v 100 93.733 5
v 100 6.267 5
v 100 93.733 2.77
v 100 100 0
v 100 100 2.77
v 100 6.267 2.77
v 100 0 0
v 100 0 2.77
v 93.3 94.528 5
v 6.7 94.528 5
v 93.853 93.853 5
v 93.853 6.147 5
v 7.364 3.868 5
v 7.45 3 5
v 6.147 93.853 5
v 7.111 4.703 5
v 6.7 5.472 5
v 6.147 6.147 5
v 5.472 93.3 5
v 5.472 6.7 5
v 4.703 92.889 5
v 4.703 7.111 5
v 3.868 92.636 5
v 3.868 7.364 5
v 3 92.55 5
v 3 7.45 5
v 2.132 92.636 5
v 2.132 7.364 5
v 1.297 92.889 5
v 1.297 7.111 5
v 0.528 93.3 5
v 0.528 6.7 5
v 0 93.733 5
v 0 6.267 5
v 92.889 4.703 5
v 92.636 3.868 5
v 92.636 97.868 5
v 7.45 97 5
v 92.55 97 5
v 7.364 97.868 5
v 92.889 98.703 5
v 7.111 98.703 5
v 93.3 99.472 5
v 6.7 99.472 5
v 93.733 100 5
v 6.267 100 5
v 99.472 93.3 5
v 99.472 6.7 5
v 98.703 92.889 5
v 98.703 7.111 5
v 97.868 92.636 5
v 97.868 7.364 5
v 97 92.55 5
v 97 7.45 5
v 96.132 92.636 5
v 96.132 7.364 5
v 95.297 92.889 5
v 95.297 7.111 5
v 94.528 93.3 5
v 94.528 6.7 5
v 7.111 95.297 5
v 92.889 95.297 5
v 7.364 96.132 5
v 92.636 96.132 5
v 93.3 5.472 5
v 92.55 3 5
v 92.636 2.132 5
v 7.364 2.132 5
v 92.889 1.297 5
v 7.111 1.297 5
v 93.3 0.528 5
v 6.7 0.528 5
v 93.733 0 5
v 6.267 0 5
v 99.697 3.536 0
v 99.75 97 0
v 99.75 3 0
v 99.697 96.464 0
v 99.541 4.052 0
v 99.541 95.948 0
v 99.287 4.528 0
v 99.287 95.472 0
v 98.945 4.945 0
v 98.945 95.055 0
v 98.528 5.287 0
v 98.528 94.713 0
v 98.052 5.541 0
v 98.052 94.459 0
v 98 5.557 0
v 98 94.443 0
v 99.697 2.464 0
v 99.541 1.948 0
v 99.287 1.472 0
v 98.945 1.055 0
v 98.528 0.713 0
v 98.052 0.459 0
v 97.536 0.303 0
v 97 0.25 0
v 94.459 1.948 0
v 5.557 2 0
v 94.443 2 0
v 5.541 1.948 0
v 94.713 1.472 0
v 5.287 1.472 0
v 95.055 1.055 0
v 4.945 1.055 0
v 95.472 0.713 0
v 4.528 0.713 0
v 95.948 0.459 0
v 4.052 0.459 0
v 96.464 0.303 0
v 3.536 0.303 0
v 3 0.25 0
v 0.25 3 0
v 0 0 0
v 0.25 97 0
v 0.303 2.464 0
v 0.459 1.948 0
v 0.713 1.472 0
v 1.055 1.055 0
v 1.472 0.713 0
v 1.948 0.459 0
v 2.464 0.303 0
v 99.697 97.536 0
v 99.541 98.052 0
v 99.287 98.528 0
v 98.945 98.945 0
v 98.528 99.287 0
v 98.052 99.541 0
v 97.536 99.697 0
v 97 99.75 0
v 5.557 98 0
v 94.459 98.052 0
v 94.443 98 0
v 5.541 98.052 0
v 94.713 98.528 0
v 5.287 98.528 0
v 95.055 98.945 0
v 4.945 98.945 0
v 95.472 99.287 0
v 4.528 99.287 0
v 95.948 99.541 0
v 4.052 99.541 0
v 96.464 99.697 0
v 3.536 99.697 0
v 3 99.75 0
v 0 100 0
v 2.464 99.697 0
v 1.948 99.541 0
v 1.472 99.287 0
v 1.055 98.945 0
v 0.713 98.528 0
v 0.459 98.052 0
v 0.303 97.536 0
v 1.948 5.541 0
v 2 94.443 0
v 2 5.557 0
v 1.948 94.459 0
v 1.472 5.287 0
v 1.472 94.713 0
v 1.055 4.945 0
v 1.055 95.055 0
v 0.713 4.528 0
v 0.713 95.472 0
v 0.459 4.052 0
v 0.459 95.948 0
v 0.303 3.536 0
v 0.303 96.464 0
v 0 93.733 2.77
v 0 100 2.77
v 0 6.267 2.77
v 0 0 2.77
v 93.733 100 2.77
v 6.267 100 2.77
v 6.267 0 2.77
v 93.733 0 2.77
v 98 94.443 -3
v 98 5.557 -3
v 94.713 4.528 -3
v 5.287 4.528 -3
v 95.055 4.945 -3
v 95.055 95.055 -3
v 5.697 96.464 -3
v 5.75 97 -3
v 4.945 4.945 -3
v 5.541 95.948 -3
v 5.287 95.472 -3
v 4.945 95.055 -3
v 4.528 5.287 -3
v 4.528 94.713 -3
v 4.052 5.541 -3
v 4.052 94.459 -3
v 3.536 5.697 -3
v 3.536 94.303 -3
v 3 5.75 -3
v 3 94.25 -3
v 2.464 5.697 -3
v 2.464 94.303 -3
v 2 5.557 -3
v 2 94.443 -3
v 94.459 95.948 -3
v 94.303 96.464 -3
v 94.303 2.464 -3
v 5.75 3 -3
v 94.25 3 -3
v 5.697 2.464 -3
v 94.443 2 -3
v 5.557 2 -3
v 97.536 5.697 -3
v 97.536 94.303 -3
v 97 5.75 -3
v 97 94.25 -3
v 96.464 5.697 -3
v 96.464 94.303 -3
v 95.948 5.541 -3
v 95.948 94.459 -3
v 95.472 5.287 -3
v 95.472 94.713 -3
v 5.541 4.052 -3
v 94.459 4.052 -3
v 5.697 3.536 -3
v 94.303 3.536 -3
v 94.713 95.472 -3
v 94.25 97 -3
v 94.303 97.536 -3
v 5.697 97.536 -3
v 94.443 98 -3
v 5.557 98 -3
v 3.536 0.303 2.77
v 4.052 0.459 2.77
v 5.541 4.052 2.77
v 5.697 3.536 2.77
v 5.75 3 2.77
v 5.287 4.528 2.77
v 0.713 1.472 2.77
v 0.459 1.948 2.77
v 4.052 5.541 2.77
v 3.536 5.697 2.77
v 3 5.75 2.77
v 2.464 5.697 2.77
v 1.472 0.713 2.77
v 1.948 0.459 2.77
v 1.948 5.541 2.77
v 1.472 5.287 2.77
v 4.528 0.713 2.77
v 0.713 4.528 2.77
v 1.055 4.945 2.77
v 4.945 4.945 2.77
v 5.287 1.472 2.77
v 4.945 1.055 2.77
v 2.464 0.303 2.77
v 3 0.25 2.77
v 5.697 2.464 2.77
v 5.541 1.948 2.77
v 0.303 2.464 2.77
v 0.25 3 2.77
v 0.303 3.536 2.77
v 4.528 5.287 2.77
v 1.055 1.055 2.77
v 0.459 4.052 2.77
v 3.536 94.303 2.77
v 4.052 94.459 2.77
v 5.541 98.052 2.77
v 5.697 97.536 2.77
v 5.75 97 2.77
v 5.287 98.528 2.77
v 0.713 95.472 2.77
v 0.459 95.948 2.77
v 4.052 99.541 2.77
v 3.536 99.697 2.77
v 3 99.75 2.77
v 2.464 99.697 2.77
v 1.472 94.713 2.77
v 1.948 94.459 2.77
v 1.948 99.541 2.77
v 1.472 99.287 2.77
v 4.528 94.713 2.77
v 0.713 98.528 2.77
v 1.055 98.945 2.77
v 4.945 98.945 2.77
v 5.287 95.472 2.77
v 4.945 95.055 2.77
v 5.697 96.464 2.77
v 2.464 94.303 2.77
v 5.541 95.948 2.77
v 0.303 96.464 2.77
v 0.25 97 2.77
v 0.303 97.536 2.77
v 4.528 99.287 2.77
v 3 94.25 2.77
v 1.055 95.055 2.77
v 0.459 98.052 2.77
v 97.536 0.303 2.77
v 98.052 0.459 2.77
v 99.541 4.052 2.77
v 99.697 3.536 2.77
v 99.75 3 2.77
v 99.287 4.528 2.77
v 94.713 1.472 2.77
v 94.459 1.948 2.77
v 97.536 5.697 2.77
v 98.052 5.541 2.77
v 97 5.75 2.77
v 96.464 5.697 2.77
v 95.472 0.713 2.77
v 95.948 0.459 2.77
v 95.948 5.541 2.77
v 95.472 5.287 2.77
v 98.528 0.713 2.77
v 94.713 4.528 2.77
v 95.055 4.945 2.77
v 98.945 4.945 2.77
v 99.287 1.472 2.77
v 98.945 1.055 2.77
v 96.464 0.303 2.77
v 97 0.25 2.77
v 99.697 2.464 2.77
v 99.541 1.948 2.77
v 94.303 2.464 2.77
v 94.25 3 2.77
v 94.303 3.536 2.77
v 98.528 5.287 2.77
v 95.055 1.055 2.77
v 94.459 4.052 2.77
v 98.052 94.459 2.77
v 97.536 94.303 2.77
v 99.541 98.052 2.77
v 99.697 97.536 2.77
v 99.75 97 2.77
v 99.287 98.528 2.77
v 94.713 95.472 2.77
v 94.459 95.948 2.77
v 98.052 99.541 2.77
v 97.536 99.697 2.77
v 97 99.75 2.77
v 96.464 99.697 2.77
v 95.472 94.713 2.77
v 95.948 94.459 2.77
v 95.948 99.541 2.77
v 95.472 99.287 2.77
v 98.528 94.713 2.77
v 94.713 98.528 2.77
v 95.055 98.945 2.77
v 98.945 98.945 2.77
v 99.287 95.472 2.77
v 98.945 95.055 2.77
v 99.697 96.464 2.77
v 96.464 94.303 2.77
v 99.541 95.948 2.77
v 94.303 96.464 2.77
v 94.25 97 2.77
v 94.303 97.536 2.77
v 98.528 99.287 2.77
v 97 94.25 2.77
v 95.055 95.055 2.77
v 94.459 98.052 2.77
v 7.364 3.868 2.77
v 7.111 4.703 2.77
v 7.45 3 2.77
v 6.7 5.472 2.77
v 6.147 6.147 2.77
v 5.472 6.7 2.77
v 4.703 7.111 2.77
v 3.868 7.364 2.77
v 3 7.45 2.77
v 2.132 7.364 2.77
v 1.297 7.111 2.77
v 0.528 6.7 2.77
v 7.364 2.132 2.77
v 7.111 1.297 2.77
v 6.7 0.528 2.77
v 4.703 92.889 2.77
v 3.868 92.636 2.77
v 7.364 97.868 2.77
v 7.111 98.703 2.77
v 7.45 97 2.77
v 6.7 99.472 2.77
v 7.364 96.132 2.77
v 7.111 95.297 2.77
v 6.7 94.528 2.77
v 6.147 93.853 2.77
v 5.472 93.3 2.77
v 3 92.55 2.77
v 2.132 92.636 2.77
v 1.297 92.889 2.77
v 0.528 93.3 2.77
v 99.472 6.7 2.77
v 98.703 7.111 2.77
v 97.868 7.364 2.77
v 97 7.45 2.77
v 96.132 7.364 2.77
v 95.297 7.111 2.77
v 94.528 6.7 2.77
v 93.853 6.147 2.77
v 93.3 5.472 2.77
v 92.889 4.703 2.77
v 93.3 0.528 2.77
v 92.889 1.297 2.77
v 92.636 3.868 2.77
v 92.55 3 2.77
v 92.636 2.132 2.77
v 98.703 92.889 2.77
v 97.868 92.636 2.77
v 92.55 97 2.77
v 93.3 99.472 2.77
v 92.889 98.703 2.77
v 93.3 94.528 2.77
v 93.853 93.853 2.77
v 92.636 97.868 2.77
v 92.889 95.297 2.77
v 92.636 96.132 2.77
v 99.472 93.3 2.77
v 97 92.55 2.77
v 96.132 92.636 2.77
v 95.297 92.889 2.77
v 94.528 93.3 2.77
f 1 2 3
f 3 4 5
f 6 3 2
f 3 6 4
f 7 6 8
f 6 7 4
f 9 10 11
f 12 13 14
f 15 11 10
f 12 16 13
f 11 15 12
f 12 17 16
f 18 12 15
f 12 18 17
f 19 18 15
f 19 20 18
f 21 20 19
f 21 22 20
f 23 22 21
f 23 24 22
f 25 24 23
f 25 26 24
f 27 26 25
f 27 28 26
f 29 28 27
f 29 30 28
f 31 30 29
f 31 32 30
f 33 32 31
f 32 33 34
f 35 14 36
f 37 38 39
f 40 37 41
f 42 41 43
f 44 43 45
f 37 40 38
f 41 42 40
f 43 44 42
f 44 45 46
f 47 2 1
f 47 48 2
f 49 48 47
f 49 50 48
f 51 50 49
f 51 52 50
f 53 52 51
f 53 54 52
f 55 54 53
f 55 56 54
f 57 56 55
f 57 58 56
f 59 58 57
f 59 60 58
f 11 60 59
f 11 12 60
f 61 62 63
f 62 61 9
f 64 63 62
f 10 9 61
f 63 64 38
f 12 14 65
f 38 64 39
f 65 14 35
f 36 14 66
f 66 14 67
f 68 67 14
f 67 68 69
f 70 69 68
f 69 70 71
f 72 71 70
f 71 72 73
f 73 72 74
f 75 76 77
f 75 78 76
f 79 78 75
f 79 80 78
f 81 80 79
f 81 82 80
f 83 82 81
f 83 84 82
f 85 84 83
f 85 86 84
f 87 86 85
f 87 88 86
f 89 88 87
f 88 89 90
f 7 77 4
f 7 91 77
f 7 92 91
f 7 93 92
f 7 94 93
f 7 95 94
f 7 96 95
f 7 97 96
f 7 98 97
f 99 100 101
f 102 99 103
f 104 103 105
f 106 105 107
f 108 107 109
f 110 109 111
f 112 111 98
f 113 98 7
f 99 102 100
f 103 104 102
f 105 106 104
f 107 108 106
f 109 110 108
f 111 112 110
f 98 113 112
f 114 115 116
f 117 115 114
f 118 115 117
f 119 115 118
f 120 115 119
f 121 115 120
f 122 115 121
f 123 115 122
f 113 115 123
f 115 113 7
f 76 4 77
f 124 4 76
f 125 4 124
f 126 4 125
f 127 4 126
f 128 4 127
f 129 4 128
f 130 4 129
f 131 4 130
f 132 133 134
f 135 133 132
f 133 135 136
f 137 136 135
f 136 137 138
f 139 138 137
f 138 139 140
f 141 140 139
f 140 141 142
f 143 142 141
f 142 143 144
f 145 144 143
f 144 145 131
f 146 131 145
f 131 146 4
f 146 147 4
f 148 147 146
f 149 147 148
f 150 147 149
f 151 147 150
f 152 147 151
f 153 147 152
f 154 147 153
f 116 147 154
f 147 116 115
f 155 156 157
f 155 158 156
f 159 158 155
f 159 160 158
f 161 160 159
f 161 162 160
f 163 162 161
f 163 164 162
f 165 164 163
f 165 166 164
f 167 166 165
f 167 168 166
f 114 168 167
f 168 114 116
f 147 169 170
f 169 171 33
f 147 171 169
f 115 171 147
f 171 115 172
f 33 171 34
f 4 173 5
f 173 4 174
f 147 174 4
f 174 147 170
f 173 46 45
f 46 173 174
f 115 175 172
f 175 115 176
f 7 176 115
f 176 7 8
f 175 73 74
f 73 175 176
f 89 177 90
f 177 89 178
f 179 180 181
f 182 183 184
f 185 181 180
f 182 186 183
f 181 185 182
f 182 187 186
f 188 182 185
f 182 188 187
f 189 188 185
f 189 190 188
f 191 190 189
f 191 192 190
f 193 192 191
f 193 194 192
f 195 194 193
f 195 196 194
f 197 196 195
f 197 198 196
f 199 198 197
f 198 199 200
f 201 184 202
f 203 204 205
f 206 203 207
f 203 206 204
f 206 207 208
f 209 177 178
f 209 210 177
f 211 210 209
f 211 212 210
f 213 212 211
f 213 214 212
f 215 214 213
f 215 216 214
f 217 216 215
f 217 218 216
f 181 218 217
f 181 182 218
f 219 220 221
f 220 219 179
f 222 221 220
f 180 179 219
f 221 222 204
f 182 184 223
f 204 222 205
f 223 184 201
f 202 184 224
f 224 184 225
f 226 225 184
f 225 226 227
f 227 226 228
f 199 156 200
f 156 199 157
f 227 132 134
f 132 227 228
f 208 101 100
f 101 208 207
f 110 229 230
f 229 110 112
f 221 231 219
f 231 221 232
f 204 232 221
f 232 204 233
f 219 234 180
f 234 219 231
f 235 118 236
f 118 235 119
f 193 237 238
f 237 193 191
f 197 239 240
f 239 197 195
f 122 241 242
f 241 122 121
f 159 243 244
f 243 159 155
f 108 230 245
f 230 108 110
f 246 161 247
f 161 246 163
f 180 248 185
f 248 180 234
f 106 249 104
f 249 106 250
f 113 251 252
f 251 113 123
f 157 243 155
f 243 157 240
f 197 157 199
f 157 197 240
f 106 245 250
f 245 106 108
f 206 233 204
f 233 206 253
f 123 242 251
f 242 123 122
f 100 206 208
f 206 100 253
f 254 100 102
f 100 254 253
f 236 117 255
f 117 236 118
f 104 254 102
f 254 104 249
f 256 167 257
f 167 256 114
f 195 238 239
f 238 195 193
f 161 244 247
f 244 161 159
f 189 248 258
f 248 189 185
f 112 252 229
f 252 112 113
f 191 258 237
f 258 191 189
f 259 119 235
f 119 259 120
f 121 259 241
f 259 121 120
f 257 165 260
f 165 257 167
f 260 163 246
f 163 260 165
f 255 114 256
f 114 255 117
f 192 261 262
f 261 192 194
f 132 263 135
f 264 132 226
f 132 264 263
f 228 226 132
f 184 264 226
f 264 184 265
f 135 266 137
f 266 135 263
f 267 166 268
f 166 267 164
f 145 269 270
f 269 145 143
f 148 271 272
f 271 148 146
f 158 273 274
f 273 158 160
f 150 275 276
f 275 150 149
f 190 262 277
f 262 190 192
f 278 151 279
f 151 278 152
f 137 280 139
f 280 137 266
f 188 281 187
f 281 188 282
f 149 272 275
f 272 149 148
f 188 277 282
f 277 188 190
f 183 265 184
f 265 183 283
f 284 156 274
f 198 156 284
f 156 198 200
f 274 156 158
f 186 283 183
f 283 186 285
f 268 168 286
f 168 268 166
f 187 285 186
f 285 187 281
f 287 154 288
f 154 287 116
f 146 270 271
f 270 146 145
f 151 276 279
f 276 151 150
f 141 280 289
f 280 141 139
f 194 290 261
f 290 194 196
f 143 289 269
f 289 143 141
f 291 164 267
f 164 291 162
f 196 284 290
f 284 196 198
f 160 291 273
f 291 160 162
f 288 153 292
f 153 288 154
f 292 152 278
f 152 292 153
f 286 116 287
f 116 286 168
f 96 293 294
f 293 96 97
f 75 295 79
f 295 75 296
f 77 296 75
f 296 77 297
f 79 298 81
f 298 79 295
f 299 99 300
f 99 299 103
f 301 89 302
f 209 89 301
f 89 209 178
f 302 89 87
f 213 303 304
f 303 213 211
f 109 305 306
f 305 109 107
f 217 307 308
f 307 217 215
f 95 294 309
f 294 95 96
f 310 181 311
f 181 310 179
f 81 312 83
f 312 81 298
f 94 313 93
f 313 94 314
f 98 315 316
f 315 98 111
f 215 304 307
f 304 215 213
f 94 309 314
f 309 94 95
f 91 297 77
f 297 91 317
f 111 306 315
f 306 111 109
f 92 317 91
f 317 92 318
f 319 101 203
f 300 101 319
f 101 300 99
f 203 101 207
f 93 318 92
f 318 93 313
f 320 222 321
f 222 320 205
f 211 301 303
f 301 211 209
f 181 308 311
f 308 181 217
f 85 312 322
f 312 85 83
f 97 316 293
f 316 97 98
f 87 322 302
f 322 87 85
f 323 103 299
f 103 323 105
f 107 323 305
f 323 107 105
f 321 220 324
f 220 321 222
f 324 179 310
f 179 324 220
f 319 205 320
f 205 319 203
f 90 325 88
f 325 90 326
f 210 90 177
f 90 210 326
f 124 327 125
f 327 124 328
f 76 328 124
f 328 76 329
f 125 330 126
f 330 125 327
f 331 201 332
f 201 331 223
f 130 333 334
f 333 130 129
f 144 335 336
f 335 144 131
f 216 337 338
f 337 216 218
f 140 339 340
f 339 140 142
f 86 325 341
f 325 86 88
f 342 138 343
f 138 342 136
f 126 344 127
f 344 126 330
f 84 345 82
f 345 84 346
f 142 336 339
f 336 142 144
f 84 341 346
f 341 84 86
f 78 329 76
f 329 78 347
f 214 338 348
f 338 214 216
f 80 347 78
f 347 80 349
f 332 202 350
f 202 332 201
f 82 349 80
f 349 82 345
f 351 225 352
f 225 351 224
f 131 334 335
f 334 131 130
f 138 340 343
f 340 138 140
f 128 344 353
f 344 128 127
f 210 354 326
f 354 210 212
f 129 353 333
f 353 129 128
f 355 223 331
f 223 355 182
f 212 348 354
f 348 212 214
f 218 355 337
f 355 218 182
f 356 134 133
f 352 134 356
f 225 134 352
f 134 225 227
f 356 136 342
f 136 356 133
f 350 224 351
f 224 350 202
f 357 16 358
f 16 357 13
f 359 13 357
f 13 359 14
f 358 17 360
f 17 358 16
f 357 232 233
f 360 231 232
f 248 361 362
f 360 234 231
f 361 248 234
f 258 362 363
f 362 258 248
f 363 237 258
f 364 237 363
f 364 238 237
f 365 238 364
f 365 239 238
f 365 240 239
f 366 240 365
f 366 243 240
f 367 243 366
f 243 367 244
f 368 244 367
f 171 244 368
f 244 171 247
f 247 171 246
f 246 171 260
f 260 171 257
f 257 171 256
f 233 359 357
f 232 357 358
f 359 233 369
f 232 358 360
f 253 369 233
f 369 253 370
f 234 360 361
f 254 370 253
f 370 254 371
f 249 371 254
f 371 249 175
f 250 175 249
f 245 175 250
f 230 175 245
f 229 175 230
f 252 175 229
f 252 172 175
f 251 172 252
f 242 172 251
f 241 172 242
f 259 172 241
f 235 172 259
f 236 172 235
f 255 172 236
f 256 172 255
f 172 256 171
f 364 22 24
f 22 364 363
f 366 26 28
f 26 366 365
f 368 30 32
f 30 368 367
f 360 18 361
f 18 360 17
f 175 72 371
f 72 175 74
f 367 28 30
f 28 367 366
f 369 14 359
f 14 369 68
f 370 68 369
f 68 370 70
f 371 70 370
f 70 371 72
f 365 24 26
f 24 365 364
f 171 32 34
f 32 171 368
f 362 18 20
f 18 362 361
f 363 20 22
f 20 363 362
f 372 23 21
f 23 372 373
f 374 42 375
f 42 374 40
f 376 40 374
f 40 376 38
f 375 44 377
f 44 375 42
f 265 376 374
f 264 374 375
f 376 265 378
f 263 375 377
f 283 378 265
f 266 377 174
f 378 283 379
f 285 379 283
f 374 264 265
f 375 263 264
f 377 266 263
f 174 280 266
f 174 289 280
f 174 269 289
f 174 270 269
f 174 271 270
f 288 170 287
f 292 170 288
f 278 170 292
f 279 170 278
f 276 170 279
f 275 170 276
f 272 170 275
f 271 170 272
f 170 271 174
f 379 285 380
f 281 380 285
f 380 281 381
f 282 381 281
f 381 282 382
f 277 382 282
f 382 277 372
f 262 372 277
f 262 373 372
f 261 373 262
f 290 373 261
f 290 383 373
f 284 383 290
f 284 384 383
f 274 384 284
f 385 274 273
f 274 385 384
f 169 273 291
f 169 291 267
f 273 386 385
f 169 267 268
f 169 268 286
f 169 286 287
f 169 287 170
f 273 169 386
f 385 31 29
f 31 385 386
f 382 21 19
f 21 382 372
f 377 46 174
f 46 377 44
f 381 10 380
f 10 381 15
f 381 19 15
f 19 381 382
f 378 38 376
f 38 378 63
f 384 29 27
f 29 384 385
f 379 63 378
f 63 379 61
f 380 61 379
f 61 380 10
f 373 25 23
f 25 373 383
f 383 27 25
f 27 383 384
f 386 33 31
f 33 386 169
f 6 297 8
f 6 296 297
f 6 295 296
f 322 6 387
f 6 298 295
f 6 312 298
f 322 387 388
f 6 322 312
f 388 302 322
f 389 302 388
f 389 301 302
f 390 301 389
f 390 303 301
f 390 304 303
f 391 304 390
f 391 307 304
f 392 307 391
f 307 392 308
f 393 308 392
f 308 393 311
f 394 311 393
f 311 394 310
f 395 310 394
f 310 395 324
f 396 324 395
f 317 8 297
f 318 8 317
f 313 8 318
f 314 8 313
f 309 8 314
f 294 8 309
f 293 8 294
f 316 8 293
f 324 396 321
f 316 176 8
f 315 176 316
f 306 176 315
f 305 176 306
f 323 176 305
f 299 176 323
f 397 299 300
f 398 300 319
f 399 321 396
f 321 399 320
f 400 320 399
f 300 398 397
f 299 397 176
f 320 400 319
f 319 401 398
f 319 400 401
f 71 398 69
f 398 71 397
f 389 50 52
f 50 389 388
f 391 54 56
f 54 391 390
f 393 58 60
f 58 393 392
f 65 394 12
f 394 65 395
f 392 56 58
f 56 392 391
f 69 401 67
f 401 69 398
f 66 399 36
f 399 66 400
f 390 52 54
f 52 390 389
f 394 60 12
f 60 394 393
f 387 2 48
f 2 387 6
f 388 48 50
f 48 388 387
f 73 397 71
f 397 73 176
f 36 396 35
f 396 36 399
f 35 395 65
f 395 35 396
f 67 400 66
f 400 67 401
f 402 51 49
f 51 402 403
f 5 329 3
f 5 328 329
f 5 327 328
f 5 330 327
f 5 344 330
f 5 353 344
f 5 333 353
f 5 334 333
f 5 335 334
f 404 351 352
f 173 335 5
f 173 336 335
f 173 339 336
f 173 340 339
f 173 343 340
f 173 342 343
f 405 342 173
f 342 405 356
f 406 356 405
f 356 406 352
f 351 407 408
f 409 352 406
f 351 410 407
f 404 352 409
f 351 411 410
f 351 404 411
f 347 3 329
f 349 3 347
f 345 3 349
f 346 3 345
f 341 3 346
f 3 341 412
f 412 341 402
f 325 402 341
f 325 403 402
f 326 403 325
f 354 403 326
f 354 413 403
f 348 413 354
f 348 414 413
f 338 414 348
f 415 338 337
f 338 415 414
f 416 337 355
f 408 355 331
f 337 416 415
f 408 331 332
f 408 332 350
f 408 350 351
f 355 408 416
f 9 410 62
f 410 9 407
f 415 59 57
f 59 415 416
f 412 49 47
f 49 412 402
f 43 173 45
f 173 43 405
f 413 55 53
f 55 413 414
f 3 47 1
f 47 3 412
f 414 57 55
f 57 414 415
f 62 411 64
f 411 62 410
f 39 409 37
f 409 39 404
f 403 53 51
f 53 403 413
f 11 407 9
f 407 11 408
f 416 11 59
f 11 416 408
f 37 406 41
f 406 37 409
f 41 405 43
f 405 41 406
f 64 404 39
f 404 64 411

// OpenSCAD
$fn = 32;

// ----------------------------------------------------------------------
// Enclosure lid: 100 x 100 x 5 mm, 4 bolt holes
// ----------------------------------------------------------------------

// --- parameters (mm) ---
length = 100;             // lid length, X
width = 100;              // lid width, Y
plate_t = 5;              // lid plate thickness
bolt_d = 5.5;             // bolt clearance
boss_lip = 3;             // bolt hole inset from the corner
sink = 1;                 // overlap of the lip and ribs into the plate
lip_h = 4;                // lip height below the plate
lip_wall = 2;             // lip wall thickness
cs_d = 8.9;               // countersink diameter
cs_h = 2.23;              // countersink depth

module plate() {
  cube([length, width, plate_t]);
  /* lip that drops into the housing opening, sunk into the plate */
  translate([lip_wall, lip_wall, -lip_h + sink]) cube([length - 2 * lip_wall, width - 2 * lip_wall, lip_h]);
}

difference() {
  plate();
  /* bolt pattern matching the corner bosses */
  for (sx = [0, 1]) for (sy = [0, 1])
    translate([sx * (length - 2 * boss_lip) + boss_lip, sy * (width - 2 * boss_lip) + boss_lip, -lip_h - 1])
      cylinder(h = plate_t + lip_h + 2, d = bolt_d);
  /* countersinks so the heads sit flush */
  for (sx = [0, 1]) for (sy = [0, 1])
    translate([sx * (length - 2 * boss_lip) + boss_lip, sy * (width - 2 * boss_lip) + boss_lip, plate_t - cs_h])
      cylinder(h = cs_h + 0.5, d = cs_d);
}
